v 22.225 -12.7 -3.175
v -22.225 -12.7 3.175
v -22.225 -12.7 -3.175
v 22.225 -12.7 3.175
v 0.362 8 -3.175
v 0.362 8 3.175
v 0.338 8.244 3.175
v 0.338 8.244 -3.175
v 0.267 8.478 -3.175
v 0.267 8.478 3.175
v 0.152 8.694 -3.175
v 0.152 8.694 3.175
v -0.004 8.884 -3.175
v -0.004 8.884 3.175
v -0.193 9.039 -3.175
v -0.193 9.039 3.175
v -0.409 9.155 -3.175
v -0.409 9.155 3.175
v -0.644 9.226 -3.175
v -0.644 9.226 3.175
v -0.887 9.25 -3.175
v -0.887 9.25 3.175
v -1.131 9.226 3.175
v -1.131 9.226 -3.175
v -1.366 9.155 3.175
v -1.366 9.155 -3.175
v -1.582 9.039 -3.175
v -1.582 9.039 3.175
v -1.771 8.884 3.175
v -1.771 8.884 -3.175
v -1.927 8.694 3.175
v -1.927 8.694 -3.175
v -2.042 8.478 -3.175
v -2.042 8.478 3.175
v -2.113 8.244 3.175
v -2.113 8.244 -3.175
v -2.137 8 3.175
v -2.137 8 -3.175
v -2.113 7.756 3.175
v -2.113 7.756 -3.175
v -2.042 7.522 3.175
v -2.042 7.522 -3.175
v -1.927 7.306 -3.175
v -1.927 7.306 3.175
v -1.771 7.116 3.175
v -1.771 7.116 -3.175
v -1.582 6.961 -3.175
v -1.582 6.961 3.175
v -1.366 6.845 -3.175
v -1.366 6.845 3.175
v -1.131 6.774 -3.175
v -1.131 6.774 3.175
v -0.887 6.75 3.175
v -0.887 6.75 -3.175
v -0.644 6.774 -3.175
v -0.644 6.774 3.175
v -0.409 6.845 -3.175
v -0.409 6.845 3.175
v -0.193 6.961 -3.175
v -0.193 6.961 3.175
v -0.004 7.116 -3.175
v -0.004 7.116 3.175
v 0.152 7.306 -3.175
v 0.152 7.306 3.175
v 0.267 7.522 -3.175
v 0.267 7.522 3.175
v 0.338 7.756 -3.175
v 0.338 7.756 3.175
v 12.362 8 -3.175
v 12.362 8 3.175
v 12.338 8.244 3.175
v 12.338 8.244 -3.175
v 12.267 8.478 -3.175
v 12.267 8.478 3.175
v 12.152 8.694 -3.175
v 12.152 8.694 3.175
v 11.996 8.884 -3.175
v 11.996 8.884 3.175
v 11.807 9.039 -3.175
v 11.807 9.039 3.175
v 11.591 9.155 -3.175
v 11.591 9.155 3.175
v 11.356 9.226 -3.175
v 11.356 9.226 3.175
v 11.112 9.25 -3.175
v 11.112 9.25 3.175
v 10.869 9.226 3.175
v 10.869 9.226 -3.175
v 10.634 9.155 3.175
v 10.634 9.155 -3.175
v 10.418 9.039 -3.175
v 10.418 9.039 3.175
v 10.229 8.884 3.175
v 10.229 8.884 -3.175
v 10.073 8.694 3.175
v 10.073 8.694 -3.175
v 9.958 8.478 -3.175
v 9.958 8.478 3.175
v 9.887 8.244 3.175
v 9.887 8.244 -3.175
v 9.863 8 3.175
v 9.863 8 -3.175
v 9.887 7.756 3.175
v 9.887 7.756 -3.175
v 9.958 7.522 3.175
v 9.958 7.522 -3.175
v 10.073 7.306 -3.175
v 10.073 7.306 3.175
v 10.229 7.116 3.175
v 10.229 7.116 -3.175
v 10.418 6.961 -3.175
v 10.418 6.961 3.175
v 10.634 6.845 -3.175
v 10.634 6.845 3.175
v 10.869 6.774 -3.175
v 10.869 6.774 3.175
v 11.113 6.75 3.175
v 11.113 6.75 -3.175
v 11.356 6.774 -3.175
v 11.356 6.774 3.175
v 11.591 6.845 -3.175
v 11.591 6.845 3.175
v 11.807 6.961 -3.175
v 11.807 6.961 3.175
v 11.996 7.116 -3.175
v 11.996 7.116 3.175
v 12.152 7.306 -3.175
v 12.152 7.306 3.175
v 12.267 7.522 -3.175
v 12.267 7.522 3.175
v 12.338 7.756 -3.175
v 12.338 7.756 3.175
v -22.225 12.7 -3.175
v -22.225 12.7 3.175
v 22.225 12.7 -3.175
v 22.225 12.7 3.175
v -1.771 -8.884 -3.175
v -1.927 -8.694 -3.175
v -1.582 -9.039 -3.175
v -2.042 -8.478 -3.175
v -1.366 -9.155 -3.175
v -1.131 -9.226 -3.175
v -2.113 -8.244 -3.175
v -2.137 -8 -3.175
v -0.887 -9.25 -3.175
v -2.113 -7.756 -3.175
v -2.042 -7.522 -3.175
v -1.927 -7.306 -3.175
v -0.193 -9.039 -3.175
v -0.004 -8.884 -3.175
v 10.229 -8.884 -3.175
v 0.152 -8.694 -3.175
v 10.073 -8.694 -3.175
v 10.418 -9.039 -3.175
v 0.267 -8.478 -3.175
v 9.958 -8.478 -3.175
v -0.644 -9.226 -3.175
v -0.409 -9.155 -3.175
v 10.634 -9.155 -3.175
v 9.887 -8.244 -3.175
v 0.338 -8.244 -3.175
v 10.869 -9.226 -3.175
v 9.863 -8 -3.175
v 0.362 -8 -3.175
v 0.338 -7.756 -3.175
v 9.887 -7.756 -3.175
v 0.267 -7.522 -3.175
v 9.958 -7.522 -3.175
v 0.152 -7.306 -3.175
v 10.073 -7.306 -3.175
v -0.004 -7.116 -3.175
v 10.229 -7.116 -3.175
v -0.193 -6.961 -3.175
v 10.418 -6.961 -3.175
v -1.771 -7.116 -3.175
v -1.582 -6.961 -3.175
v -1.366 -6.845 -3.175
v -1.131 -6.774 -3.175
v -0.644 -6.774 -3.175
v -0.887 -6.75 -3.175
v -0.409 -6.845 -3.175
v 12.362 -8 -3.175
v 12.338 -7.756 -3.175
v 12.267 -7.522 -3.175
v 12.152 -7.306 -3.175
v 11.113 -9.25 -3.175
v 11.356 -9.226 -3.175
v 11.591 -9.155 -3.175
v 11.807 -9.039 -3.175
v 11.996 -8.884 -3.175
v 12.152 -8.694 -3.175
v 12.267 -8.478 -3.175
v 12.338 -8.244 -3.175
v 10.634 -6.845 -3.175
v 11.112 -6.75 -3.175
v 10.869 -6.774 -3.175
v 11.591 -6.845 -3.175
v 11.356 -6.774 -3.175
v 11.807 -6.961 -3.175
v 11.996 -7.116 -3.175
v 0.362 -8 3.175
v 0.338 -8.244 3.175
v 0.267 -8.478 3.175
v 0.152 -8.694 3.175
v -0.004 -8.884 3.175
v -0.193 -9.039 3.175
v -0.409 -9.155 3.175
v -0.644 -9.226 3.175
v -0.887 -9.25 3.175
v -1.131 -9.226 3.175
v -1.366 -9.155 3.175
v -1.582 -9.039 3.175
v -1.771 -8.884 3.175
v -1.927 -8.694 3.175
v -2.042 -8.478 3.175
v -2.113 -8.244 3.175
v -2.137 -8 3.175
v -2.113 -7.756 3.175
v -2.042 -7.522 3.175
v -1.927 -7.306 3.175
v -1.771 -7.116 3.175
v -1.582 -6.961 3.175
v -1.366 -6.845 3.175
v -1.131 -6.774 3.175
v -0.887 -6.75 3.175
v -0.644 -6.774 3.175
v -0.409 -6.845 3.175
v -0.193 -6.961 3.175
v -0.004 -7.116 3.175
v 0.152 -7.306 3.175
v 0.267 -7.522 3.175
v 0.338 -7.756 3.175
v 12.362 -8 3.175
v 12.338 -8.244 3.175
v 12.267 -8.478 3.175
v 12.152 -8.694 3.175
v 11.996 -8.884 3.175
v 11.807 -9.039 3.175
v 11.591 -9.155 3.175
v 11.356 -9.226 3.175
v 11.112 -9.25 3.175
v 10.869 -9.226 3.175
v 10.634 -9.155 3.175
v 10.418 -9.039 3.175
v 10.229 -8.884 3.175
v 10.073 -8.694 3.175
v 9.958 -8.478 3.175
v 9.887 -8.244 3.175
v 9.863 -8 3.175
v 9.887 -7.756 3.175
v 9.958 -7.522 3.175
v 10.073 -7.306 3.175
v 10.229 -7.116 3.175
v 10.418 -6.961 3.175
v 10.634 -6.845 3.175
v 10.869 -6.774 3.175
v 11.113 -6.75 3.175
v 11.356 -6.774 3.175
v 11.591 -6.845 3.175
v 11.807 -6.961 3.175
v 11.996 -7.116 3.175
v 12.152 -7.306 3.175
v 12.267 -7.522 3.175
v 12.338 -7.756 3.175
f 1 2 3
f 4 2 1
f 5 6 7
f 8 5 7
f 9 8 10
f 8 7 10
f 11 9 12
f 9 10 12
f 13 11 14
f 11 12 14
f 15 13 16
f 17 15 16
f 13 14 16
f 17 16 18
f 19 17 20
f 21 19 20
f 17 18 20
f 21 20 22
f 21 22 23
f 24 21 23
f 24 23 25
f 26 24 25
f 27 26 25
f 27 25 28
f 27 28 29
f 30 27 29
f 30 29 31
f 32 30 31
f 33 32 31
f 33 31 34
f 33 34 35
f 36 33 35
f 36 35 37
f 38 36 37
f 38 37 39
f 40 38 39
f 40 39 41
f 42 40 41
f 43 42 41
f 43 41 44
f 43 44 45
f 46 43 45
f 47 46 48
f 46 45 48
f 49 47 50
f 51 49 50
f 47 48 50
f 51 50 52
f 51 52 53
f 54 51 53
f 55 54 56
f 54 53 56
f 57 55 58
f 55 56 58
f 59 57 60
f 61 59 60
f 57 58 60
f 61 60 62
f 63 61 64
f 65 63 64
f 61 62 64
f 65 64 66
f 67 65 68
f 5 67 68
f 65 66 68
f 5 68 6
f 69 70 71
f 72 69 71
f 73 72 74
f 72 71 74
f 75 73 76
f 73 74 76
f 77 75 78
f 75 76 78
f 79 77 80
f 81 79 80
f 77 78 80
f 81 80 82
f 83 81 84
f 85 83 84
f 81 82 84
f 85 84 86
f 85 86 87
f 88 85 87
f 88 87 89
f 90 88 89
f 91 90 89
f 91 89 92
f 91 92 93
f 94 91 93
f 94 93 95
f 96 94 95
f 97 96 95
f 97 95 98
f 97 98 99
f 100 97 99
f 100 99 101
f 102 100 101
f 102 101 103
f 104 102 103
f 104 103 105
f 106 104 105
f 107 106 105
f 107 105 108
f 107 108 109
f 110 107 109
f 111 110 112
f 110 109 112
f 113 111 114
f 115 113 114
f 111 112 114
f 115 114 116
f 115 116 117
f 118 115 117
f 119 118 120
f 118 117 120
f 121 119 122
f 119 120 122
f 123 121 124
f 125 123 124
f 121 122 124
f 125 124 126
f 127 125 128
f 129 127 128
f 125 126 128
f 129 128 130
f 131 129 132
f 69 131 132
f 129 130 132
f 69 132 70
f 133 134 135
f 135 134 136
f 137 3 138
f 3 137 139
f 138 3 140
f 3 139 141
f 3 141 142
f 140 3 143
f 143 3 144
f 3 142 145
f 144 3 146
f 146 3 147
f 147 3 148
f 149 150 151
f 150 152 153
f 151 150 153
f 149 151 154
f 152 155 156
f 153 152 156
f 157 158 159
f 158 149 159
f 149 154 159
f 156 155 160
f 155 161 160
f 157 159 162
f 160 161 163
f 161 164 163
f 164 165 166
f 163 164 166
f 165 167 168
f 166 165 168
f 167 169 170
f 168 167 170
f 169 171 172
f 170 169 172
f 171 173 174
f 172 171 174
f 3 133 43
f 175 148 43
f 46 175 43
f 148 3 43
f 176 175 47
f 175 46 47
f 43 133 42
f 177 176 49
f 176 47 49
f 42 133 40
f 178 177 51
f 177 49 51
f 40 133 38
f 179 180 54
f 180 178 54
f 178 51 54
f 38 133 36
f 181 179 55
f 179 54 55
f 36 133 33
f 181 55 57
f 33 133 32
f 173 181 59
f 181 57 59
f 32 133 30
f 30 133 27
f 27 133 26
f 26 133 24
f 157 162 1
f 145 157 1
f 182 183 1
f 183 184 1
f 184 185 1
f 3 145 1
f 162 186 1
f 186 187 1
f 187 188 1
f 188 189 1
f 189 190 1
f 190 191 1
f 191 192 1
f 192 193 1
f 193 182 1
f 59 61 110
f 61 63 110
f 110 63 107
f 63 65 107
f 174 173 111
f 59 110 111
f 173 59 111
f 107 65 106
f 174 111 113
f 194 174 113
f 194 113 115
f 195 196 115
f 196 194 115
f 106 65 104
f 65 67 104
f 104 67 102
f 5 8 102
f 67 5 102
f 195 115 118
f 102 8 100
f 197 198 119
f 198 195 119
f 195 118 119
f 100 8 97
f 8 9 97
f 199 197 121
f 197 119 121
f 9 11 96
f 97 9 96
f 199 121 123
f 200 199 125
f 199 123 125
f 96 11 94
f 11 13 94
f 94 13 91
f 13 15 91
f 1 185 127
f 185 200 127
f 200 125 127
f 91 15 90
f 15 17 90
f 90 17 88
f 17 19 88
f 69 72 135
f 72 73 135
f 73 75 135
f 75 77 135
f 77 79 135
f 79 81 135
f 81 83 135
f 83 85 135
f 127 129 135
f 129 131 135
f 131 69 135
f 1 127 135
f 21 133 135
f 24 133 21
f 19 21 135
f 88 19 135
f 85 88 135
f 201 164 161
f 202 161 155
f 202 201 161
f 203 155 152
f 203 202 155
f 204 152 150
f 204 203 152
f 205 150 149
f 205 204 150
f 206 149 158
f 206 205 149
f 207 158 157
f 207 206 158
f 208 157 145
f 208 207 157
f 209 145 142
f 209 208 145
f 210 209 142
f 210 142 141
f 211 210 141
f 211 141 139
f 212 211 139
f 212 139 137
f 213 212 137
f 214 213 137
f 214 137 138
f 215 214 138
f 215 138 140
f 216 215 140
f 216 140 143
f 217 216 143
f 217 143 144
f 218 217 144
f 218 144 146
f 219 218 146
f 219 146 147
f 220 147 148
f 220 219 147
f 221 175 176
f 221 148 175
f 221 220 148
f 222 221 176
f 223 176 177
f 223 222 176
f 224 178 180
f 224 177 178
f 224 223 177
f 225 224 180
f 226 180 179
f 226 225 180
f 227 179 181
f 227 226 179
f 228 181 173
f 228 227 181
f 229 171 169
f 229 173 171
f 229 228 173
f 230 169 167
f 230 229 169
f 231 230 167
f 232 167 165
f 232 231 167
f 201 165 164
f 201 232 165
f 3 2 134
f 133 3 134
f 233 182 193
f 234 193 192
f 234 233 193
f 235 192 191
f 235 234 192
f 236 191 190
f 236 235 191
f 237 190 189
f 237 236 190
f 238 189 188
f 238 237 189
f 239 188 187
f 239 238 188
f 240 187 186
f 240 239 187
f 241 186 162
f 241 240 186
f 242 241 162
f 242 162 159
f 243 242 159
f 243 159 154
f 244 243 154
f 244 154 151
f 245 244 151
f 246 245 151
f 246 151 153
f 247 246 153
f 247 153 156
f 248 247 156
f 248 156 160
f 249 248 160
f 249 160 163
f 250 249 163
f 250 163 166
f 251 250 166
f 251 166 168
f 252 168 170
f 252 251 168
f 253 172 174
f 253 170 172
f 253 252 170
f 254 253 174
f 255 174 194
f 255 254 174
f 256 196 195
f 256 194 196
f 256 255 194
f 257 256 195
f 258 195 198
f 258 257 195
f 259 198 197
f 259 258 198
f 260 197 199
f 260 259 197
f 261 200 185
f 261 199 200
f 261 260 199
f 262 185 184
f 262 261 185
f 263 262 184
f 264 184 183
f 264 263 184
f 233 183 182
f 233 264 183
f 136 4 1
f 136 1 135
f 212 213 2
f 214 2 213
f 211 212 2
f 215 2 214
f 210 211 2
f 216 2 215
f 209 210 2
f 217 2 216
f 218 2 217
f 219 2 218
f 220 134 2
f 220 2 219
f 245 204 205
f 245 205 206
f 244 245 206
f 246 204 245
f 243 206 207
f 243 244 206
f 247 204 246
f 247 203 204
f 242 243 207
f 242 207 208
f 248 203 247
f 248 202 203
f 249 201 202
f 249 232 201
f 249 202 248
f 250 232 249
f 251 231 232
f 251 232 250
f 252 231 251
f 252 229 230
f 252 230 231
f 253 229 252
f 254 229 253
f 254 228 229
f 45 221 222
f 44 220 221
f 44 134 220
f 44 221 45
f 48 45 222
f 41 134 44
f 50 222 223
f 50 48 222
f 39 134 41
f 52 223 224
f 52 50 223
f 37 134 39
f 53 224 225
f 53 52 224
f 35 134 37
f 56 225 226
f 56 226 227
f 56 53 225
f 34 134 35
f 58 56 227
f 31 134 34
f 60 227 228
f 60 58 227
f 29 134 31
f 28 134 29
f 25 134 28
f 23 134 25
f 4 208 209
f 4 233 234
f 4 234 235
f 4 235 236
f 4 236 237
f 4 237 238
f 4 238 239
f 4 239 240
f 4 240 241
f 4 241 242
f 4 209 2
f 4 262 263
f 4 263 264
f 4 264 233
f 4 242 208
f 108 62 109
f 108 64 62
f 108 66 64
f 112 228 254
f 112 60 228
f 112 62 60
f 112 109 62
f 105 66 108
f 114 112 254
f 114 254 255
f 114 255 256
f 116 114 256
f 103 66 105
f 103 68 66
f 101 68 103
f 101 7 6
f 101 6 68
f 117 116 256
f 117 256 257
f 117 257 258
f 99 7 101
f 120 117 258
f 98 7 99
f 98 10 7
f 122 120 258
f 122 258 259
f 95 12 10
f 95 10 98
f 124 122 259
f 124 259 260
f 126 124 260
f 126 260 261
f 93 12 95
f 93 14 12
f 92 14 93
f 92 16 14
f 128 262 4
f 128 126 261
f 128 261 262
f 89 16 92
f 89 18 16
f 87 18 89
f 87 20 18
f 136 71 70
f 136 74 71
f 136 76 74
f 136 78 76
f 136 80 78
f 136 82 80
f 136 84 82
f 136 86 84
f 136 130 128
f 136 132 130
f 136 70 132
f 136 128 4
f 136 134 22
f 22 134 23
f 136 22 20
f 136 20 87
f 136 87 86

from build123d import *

# Parameters (mm, degrees)
ESQUISSE1_W             = 44.45
ESQUISSE1_H             = 25.4
BOSS_EXTRU_1_DEPTH      = 3.175
ESQUISSE2_R             = 1.24968
ENL_V_MAT_EXTRU_1_DEPTH = 27.373530765


with BuildPart() as part:
    # Esquisse1 → Boss.-Extru.1 (new, symmetric)
    with BuildSketch(Plane.XY):
        Rectangle(ESQUISSE1_W, ESQUISSE1_H)
    extrude(amount=BOSS_EXTRU_1_DEPTH, both=True)

    # Esquisse2 → Enlèv. mat.-Extru.1 (cut, through all)
    with BuildSketch(Plane.XY.offset(3.175)):
        with Locations((-0.8875, 8)):
            Circle(ESQUISSE2_R)
        with Locations((11.1125, 8)):
            Circle(ESQUISSE2_R)
    enl_v_mat_extru_1 = extrude(amount=-ENL_V_MAT_EXTRU_1_DEPTH, mode=Mode.SUBTRACT)

    # Symétrie1: Enlèv. mat.-Extru.1 across plane
    add(enl_v_mat_extru_1.mirror(Plane.ZX), mode=Mode.SUBTRACT)


solid = part.part
